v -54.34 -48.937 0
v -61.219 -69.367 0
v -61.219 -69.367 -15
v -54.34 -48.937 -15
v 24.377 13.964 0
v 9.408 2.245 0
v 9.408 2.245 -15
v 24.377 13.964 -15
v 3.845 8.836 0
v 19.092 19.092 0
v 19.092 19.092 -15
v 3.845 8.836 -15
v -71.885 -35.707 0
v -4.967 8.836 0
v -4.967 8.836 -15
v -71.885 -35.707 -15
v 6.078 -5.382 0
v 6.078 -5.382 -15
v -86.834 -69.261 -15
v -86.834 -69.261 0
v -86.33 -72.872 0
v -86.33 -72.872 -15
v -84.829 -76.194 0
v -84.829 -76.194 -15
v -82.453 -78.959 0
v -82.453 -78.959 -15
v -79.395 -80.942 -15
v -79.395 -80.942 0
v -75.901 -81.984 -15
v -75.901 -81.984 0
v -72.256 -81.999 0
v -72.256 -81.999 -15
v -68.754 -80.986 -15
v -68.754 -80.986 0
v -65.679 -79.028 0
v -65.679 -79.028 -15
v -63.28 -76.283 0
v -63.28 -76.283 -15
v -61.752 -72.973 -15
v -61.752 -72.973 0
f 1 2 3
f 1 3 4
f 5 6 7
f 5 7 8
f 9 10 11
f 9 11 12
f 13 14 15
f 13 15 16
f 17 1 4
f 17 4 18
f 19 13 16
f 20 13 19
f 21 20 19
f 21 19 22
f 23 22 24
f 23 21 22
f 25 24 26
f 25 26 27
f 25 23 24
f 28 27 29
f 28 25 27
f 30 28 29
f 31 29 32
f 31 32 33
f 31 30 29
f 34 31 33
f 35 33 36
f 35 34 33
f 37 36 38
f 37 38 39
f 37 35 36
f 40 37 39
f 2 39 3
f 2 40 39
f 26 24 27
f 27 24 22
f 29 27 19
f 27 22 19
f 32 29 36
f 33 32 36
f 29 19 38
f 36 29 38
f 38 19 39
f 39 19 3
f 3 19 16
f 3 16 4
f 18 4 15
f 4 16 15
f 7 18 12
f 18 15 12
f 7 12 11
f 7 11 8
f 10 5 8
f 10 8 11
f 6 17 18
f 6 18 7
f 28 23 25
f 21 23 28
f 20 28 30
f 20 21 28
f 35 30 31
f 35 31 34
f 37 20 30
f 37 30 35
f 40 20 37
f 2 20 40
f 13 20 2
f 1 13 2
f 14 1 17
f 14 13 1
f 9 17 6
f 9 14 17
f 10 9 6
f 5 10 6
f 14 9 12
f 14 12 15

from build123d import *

# Parameters (mm, degrees)
BOSS_EXTRUDE1_DEPTH = 15


with BuildPart() as part:
    # Sketch1 → Boss-Extrude1 (new body)
    with BuildSketch(Plane.XY):
        with BuildLine():
            Line((-4.967004399, 8.835776472), (-71.884952029, -35.707198588))
            Line((-71.884952029, -35.707198588), (-86.833591926, -69.261290707))
            ThreePointArc((-86.833591926, -69.261290707), (-74.078855086, -82.121498504), (-61.218647289, -69.366761664))
            Line((-61.218647289, -69.366761664), (-54.340359202, -48.936608433))
            Line((-54.340359202, -48.936608433), (6.077760006, -5.382226646))
            Line((6.077760006, -5.382226646), (9.40798921, 2.245366823))
            Line((9.40798921, 2.245366823), (24.377091509, 13.963829782))
            Line((24.377091509, 13.963829782), (19.091883092, 19.091883092))
            Line((19.091883092, 19.091883092), (3.844956844, 8.835776472))
            Line((3.844956844, 8.835776472), (-4.967004399, 8.835776472))
        make_face()
    extrude(amount=-BOSS_EXTRUDE1_DEPTH)


solid = part.part
